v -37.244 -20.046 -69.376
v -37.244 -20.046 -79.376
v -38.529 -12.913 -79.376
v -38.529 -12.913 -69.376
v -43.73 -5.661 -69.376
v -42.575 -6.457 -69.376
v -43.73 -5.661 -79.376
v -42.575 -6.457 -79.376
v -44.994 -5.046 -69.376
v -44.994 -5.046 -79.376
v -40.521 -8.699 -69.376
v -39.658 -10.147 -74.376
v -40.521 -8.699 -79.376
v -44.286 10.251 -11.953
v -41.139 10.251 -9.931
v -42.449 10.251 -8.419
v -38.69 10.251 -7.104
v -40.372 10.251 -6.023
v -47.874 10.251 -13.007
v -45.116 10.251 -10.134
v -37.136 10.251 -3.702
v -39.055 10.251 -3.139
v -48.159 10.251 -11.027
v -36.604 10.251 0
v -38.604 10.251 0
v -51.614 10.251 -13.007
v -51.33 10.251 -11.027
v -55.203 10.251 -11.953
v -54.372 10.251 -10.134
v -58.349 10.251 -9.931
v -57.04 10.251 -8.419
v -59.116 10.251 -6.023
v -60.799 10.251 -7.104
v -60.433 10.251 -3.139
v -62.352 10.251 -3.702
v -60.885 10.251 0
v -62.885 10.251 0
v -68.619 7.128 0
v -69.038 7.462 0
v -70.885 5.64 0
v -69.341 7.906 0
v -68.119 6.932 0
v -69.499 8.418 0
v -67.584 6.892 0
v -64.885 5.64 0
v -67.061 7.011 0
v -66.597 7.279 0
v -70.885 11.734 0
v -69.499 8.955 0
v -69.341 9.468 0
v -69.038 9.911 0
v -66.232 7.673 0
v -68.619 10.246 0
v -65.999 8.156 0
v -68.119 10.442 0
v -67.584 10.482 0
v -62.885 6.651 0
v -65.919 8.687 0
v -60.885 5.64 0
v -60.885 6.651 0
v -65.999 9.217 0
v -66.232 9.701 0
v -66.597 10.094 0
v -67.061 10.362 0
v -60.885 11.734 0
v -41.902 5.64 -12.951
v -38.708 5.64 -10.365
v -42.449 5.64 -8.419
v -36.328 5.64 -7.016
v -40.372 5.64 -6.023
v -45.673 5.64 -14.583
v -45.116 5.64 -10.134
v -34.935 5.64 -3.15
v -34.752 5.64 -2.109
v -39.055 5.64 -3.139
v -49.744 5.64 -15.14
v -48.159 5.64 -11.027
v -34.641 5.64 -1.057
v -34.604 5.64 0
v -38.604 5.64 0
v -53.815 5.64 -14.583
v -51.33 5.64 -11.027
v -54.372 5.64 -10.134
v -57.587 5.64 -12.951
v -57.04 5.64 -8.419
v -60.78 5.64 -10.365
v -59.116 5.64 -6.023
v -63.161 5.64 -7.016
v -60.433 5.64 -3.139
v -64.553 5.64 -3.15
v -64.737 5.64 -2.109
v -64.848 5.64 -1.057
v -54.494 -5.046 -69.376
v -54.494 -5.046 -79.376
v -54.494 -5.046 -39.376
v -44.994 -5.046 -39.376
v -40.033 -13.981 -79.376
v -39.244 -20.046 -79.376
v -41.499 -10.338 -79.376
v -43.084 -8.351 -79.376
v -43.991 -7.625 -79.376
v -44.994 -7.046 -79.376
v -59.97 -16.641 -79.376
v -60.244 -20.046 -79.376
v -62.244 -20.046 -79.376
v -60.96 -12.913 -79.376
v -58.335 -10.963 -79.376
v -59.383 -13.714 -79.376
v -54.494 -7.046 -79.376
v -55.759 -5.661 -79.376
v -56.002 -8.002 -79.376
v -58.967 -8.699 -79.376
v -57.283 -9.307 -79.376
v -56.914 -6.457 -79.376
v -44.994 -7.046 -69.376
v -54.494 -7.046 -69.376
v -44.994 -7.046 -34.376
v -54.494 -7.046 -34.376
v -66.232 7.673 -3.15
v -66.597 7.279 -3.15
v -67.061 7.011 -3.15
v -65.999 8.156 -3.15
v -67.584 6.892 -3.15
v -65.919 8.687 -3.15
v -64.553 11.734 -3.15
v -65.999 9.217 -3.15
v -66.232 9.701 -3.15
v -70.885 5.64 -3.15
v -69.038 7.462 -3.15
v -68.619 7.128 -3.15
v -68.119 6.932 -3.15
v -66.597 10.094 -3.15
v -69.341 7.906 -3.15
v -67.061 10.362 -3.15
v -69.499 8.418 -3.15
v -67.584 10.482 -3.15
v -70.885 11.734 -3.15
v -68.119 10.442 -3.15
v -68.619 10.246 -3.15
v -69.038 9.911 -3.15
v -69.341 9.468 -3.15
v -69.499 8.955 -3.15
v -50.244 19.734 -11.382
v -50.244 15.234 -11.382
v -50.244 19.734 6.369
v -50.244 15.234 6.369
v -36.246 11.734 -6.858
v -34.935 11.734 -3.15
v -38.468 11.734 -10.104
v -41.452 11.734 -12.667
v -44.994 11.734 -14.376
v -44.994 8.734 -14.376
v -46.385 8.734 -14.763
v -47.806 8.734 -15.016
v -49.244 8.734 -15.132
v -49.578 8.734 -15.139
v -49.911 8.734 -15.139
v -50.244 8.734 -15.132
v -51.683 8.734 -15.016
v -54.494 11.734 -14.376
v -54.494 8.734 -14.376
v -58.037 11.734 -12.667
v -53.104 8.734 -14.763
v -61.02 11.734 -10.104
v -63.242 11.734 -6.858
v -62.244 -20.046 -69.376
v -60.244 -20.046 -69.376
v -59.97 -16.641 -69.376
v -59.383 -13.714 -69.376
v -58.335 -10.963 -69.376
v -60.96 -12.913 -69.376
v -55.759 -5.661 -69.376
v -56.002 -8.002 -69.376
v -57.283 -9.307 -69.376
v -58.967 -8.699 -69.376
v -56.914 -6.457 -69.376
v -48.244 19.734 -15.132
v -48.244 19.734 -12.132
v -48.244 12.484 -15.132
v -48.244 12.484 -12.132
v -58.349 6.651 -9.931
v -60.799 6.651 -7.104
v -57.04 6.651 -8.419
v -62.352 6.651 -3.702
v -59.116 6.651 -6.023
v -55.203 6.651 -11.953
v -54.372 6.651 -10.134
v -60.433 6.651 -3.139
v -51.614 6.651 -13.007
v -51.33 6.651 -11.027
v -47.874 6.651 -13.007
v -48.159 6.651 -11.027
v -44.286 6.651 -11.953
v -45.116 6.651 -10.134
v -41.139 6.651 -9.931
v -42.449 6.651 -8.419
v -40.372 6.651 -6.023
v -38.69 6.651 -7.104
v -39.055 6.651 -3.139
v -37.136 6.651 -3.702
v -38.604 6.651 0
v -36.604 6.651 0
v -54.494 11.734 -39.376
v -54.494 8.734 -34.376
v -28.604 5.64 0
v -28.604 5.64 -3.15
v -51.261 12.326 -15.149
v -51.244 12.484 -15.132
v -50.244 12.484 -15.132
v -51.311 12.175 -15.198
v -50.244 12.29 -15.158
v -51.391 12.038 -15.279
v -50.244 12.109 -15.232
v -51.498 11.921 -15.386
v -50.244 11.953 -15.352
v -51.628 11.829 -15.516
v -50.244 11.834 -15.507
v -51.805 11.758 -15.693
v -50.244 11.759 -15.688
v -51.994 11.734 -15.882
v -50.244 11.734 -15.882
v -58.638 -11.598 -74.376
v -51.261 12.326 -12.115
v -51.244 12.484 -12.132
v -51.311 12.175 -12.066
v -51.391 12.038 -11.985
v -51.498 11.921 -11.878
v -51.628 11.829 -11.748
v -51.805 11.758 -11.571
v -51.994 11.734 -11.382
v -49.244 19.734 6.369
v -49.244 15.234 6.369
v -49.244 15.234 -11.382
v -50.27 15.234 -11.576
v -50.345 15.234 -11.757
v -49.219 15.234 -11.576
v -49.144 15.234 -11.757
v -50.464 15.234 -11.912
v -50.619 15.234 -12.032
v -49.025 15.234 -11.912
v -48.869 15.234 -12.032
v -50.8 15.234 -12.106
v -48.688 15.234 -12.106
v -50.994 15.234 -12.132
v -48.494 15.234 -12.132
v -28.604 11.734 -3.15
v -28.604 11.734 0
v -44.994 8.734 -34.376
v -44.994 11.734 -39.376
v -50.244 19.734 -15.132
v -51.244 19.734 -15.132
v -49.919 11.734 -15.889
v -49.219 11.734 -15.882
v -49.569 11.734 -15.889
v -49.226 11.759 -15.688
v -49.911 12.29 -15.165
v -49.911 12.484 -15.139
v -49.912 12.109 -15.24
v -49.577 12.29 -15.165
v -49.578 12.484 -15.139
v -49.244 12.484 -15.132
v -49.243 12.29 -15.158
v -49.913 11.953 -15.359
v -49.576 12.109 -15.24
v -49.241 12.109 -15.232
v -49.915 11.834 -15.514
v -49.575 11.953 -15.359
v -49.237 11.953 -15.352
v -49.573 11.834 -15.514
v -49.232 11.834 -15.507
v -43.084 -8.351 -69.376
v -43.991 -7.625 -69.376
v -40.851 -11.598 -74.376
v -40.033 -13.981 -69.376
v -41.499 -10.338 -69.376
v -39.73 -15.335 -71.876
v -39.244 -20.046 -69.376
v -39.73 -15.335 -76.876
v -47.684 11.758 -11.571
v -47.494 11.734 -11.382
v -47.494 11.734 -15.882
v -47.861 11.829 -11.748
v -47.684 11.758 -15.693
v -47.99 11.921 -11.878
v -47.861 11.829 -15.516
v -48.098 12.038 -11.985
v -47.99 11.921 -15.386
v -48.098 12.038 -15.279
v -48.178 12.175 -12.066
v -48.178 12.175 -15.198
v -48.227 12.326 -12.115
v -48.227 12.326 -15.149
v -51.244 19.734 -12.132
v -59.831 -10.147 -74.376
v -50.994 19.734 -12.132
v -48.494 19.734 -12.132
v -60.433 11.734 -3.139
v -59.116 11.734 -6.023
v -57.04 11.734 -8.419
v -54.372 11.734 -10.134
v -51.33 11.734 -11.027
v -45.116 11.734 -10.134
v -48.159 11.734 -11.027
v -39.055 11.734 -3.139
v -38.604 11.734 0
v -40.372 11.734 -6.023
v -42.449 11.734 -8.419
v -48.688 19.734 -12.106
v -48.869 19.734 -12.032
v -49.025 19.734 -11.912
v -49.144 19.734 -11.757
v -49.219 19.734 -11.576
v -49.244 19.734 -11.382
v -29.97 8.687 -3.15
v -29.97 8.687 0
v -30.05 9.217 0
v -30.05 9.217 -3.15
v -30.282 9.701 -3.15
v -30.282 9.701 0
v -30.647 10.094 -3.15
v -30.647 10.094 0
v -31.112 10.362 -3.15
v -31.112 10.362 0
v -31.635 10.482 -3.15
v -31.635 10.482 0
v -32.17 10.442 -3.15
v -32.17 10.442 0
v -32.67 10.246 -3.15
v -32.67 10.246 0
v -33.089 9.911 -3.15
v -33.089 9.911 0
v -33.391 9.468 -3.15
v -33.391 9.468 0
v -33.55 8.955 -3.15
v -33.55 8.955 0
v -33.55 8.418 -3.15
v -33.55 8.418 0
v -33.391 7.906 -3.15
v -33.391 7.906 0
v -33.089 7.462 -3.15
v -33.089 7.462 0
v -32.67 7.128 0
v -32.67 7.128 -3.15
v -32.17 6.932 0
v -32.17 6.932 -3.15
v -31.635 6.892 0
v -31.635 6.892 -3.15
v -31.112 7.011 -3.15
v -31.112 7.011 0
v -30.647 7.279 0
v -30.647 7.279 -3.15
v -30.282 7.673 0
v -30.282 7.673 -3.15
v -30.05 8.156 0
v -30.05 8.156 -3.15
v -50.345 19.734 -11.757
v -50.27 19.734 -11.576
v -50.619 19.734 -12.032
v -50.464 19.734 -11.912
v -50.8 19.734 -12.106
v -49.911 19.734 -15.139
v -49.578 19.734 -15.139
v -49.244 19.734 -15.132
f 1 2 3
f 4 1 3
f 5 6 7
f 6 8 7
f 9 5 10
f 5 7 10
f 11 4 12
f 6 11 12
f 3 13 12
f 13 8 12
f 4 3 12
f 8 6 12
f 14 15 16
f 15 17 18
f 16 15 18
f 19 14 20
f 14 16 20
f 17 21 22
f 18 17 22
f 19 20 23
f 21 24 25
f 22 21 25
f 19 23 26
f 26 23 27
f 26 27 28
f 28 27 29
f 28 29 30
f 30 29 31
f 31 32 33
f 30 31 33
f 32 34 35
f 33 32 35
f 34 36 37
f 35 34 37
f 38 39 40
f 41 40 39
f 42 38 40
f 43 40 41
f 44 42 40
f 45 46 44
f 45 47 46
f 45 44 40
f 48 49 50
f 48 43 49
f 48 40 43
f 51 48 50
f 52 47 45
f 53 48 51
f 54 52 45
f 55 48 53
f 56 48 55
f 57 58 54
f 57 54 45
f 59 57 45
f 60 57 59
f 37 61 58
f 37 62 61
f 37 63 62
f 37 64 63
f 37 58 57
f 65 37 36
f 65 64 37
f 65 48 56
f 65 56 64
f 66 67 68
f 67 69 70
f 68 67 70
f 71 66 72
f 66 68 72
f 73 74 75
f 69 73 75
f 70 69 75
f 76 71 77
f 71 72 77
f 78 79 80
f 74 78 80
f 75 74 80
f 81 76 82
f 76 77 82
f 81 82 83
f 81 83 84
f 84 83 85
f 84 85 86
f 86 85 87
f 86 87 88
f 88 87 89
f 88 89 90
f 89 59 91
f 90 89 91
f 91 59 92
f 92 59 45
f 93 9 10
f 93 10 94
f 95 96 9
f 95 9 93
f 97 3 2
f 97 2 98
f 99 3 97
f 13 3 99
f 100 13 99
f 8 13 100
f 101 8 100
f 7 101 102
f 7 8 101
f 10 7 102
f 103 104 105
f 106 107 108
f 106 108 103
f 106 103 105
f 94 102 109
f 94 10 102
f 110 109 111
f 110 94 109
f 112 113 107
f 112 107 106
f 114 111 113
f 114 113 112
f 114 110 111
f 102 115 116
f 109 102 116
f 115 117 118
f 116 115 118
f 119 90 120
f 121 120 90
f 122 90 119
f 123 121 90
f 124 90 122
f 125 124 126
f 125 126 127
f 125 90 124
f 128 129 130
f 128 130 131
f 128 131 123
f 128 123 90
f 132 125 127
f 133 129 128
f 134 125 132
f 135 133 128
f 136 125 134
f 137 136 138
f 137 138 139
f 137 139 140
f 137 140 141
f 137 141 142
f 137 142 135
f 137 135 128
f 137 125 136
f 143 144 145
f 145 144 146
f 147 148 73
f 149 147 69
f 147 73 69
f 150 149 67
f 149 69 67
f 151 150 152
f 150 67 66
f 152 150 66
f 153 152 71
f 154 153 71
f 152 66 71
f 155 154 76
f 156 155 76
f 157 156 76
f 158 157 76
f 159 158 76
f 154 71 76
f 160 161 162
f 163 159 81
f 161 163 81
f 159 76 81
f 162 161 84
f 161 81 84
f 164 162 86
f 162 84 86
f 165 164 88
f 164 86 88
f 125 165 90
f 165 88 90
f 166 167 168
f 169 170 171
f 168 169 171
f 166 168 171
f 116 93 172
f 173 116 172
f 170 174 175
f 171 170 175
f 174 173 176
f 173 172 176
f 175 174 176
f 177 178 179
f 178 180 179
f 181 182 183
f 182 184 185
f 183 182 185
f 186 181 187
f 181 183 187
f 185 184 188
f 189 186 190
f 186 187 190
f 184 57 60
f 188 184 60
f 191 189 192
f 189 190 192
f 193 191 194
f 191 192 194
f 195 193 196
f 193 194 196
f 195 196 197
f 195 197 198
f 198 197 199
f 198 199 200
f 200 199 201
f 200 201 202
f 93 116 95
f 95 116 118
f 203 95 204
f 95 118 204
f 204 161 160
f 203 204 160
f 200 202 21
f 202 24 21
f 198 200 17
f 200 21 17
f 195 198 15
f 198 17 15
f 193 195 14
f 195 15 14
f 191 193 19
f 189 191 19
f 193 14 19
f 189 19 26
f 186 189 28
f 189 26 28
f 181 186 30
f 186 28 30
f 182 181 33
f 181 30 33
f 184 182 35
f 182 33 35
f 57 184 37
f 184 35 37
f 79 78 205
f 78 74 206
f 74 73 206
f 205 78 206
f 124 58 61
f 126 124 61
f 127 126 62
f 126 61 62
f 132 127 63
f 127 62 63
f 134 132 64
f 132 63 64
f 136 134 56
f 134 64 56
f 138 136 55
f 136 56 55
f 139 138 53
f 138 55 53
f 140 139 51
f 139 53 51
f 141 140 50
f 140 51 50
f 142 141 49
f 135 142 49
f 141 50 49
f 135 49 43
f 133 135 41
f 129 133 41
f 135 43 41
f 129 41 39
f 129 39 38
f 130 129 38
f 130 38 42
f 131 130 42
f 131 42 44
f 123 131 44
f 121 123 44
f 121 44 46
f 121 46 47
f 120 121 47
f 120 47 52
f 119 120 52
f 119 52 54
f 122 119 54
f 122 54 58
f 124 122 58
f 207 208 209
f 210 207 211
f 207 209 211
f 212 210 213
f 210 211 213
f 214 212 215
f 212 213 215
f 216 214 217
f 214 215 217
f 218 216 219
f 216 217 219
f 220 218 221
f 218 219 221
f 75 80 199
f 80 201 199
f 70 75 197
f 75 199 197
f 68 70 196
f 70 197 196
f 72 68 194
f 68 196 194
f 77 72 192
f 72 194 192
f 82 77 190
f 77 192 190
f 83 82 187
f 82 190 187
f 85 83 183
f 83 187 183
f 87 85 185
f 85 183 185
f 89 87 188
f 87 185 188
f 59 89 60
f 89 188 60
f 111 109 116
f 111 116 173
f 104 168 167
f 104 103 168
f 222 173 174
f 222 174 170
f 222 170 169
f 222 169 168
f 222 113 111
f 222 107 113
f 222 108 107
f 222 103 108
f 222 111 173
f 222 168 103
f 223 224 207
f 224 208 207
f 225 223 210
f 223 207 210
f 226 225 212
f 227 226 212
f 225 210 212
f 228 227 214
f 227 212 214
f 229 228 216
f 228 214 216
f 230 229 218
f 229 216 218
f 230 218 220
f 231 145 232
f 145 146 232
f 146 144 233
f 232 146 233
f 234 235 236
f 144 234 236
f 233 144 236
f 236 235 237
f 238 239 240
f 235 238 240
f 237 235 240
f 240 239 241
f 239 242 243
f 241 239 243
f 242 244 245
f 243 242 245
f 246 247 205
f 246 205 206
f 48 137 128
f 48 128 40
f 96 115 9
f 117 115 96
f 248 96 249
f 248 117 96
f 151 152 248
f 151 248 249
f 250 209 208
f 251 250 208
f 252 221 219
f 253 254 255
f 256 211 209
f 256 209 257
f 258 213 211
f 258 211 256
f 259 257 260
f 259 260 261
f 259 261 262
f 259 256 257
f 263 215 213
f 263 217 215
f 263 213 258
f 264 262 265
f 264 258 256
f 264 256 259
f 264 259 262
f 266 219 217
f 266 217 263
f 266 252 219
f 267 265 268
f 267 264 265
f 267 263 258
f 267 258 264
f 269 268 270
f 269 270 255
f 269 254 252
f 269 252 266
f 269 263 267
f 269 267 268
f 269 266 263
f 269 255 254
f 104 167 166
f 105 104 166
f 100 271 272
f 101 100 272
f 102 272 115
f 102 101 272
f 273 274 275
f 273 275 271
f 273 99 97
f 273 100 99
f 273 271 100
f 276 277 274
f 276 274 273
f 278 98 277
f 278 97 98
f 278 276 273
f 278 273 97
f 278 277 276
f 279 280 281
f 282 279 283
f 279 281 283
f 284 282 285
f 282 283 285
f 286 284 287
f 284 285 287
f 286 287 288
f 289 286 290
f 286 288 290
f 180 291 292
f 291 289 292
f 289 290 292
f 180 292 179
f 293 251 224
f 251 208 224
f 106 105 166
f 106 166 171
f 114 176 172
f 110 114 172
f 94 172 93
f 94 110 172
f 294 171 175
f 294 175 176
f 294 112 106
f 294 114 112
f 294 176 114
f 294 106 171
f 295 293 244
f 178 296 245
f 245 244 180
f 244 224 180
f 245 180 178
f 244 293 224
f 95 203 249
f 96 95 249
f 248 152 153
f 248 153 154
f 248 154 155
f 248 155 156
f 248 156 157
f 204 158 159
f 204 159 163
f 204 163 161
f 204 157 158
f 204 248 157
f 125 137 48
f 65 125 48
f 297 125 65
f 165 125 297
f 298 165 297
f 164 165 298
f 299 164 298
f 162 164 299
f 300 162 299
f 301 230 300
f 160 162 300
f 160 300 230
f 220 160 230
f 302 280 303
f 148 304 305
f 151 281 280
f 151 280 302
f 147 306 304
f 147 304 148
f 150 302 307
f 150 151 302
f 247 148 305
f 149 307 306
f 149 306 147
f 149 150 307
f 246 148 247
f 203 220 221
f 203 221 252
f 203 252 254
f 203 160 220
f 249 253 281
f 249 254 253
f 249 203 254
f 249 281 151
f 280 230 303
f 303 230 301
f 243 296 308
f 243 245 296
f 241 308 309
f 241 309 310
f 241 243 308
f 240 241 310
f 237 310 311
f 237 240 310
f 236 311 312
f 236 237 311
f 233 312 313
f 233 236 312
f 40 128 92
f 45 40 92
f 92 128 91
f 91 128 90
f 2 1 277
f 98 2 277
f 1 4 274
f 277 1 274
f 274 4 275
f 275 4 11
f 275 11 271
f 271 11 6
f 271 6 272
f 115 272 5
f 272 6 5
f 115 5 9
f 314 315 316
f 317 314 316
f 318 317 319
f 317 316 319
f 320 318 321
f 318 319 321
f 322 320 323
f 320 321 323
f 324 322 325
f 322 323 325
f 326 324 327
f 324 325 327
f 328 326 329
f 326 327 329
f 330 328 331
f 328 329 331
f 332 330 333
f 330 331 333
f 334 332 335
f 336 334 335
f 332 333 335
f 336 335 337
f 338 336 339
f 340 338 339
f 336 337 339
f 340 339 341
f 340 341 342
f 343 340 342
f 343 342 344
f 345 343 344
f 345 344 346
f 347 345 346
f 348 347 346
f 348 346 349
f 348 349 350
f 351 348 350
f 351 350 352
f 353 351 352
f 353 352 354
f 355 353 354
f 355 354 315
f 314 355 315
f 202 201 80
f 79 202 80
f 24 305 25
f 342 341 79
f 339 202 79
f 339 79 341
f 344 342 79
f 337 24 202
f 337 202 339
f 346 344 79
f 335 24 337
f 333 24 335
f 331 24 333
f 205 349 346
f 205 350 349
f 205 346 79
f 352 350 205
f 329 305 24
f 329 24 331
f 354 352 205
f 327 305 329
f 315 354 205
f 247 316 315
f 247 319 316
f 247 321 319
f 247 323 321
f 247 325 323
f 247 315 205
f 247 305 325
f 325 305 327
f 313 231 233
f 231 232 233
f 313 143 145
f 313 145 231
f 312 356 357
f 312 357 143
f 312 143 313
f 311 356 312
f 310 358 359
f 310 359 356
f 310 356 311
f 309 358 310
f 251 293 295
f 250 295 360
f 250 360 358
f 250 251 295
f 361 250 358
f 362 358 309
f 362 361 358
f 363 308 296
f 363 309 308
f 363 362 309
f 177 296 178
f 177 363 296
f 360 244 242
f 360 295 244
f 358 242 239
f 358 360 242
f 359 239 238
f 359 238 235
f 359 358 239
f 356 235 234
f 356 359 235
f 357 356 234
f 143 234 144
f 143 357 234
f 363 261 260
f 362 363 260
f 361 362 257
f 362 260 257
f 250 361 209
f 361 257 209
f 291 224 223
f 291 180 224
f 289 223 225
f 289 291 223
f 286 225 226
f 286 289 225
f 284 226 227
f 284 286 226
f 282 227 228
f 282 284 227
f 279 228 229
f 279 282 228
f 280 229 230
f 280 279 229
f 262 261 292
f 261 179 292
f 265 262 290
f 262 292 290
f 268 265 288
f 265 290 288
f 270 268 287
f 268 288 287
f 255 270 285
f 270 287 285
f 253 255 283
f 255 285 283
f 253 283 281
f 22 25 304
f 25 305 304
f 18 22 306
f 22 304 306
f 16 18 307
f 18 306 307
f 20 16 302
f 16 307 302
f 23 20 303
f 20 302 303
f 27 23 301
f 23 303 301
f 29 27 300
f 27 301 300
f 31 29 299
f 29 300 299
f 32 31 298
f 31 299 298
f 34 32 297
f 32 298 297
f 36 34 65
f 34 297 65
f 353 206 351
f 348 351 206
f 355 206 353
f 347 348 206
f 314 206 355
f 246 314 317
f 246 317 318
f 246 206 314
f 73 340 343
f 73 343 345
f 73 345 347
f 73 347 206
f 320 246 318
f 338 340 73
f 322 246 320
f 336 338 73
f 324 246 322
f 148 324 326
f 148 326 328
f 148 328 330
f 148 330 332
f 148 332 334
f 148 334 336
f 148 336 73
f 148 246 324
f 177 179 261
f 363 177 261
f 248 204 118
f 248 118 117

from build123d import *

# Parameters (mm, degrees)
BOSS_EXTRUDE1_DEPTH = 6.5
BOSS_EXTRUDE2_DEPTH = 3
BOSS_EXTRUDE3_DEPTH = 3
SKETCH10_W          = 9.5
SKETCH10_H          = 5
BOSS_EXTRUDE4_DEPTH = 15.78
SKETCH11_W          = 9.5
SKETCH11_H          = 2
BOSS_EXTRUDE5_DEPTH = 40
BOSS_EXTRUDE6_DEPTH = 6.09393
SKETCH14_R          = 1.8
CUT_EXTRUDE1_DEPTH  = 6.3
SKETCH15_W          = 51.153217575
SKETCH15_H          = 21.210560201
CUT_EXTRUDE3_DEPTH  = 19.78
SKETCH18_W          = 3
SKETCH18_H          = 3
BOSS_EXTRUDE7_DEPTH = 6.5
FILLET1_R           = 0.75
BOSS_EXTRUDE8_DEPTH = 1.5
FILLET2_R           = 0.75
BOSS_EXTRUDE9_DEPTH = 10


with BuildPart() as part:
    # Sketch3 → Revolve1 (revolve)
    with BuildSketch(Plane.XY):
        Polygon((-62.694264441, 11.733728816), (-64.884531744, 11.733728816), (-64.884531744, 5.639799249), (-60.884531744, 5.639799249), (-60.884531744, 6.650679103), (-62.884531744, 6.650679103), (-62.884531744, 10.250679103), (-60.884531744, 10.250679103), (-60.884531744, 11.733728816), align=None)
    revolve(axis=Axis((-49.744264441, 0, 0), (0, 1, 0)))

    # Sketch7 → Boss-Extrude1 (add)
    with BuildSketch(Plane(origin=(0, 11.733728816, 0), x_dir=(1, 0, 0), z_dir=(0, 1, 0))):
        with BuildLine():
            Line((-50.244264441, 15.132008921), (-50.244264441, 13.130751112))
            ThreePointArc((-50.244264441, 13.130751112), (-49.744264441, 13.140267302), (-49.244264441, 13.130751112))
            Line((-49.244264441, 13.130751112), (-49.244264441, 15.132008921))
            ThreePointArc((-49.244264441, 15.132008921), (-49.744264441, 15.140267302), (-50.244264441, 15.132008921))
        make_face()
    extrude(amount=BOSS_EXTRUDE1_DEPTH)

    # Sketch8 → Boss-Extrude2 (add)
    with BuildSketch(Plane(origin=(0, 18.233728816, 0), x_dir=(1, 0, 0), z_dir=(0, 1, 0))):
        with BuildLine():
            Line((-50.244264441, 15.132008921), (-50.244264441, 13.130751112))
            Line((-50.244264441, 13.130751112), (-50.244264441, -6.369248888))
            Line((-50.244264441, -6.369248888), (-49.244264441, -6.369248888))
            Line((-49.244264441, -6.369248888), (-49.244264441, 13.130751112))
            Line((-49.244264441, 13.130751112), (-49.244264441, 15.132008921))
            ThreePointArc((-49.244264441, 15.132008921), (-49.744264441, 15.140267302), (-50.244264441, 15.132008921))
        make_face()
    extrude(amount=-BOSS_EXTRUDE2_DEPTH)

    # Sketch9 → Boss-Extrude3 (add)
    with BuildSketch(Plane(origin=(0, 11.733728816, 0), x_dir=(1, 0, 0), z_dir=(0, 1, 0))):
        with BuildLine():
            Line((-54.494264441, 14.375854548), (-54.494264441, 39.375854548))
            Line((-54.494264441, 39.375854548), (-44.994264441, 39.375854548))
            Line((-44.994264441, 39.375854548), (-44.994264441, 14.375854548))
            ThreePointArc((-44.994264441, 14.375854548), (-47.092177082, 14.906177465), (-49.244264441, 15.132008921))
            ThreePointArc((-49.244264441, 15.132008921), (-49.744264441, 15.140267302), (-50.244264441, 15.132008921))
            ThreePointArc((-50.244264441, 15.132008921), (-52.3963518, 14.906177465), (-54.494264441, 14.375854548))
        make_face()
    extrude(amount=-BOSS_EXTRUDE3_DEPTH)

    # Sketch10 → Boss-Extrude4 (add)
    with BuildSketch(Plane.XZ.offset(-8.733728816)):
        with Locations((-49.744264441, -36.875854548)):
            Rectangle(SKETCH10_W, SKETCH10_H)
    extrude(amount=BOSS_EXTRUDE4_DEPTH)

    # Sketch11 → Boss-Extrude5 (add)
    with BuildSketch(Plane(origin=(0, 0, -39.375854548), x_dir=(-1, 0, 0), z_dir=(0, 0, -1))):
        with Locations((49.744264441, -6.046271184)):
            Rectangle(SKETCH11_W, SKETCH11_H)
    extrude(amount=BOSS_EXTRUDE5_DEPTH)

    # Sketch13 → Boss-Extrude6 (add)
    with BuildSketch(Plane(origin=(0, 11.733728816, 0), x_dir=(1, 0, 0), z_dir=(0, 1, 0))):
        with BuildLine():
            Line((-28.603997139, 3.15), (-34.935307895, 3.15))
            ThreePointArc((-34.935307895, 3.15), (-34.603997139, 0), (-34.935307895, -3.15))
            Line((-34.935307895, -3.15), (-28.603997139, -3.15))
            Line((-28.603997139, -3.15), (-28.603997139, 3.15))
        make_face()
        with BuildLine():
            Line((-70.884531744, 3.15), (-70.884531744, -3.15))
            Line((-70.884531744, -3.15), (-64.553220987, -3.15))
            ThreePointArc((-64.553220987, -3.15), (-64.884531744, 0), (-64.553220987, 3.15))
            Line((-64.553220987, 3.15), (-70.884531744, 3.15))
        make_face()
    extrude(amount=-BOSS_EXTRUDE6_DEPTH)

    # Sketch14 → Cut-Extrude1 (cut)
    with BuildSketch(Plane.XY.offset(3.15)):
        with Locations((-31.769652517, 8.686764033)):
            Circle(SKETCH14_R)
        with Locations((-67.718876365, 8.686764033)):
            Circle(SKETCH14_R)
    extrude(amount=-CUT_EXTRUDE1_DEPTH, mode=Mode.SUBTRACT)

    # Sketch15 → Cut-Extrude3 (cut, through all)
    with BuildSketch(Plane(origin=(0, 11.733728816, 0), x_dir=(1, 0, 0), z_dir=(0, 1, 0))):
        with Locations((-49.018725857, -10.6052801)):
            Rectangle(SKETCH15_W, SKETCH15_H)
    extrude(amount=-CUT_EXTRUDE3_DEPTH, mode=Mode.SUBTRACT)

    # Sketch18 → Boss-Extrude7 (add)
    with BuildSketch(Plane(origin=(0, 11.733728816, 0), x_dir=(1, 0, 0), z_dir=(0, 1, 0))):
        with Locations((-49.744264441, 13.632008921)):
            Rectangle(SKETCH18_W, SKETCH18_H)
    extrude(amount=BOSS_EXTRUDE7_DEPTH)

    # Fillet1
    fillet1_edges = [part.edges().sort_by_distance(p)[0] for p in [
        (-50.744264441, 11.733728816, -15.132008921),
        (-48.744264441, 11.733728816, -15.132008921),
        (-49.744264441, 11.733728816, -12.132008921),
        (-48.244264441, 11.733728816, -13.632008921),
        (-51.244264441, 11.733728816, -13.632008921),
        (-49.744264441, 11.733728816, -15.140267302),
    ]]
    fillet(fillet1_edges, radius=FILLET1_R)

    # Sketch19 → Boss-Extrude8 (add)
    with BuildSketch(Plane(origin=(0, 18.233728816, 0), x_dir=(1, 0, 0), z_dir=(0, 1, 0))):
        with BuildLine():
            Line((-50.244264441, 15.132008921), (-51.244264441, 15.132008921))
            Line((-51.244264441, 15.132008921), (-51.244264441, 12.132008921))
            Line((-51.244264441, 12.132008921), (-50.244264441, 12.132008921))
            Line((-50.244264441, 12.132008921), (-50.244264441, -6.369248888))
            Line((-50.244264441, -6.369248888), (-49.244264441, -6.369248888))
            Line((-49.244264441, -6.369248888), (-49.244264441, 12.132008921))
            Line((-49.244264441, 12.132008921), (-48.244264441, 12.132008921))
            Line((-48.244264441, 12.132008921), (-48.244264441, 15.132008921))
            Line((-48.244264441, 15.132008921), (-49.244264441, 15.132008921))
            ThreePointArc((-49.244264441, 15.132008921), (-49.744264441, 15.140267302), (-50.244264441, 15.132008921))
        make_face()
    extrude(amount=BOSS_EXTRUDE8_DEPTH)

    # Fillet2
    fillet2_edges = [part.edges().sort_by_distance(p)[0] for p in [
        (-50.244264441, 17.483728816, -12.132008921),
        (-49.244264441, 17.483728816, -12.132008921),
    ]]
    fillet(fillet2_edges, radius=FILLET2_R)

    # Sketch20 → Boss-Extrude9 (add)
    with BuildSketch(Plane(origin=(0, 0, -79.375854548), x_dir=(-1, 0, 0), z_dir=(0, 0, -1))):
        with BuildLine():
            Line((37.244264441, -20.046271184), (39.244264441, -20.046271184))
            add(Edge.make_bspline(
                [(39.244264441, -20.046271184), (39.582311707, -9.650122804), (44.994264441, -7.046271184)],
                knots=[0, 0, 0, 0.599407443, 0.599407443, 0.599407443], degree=2))
            Line((44.994264441, -7.046271184), (54.494264441, -7.046271184))
            add(Edge.make_bspline(
                [(54.494264441, -7.046271184), (59.906217176, -9.650122804), (60.244264441, -20.046271184)],
                knots=[0.400592557, 0.400592557, 0.400592557, 1, 1, 1], degree=2))
            Line((60.244264441, -20.046271184), (62.244264441, -20.046271184))
            add(Edge.make_bspline(
                [(62.244264441, -20.046271184), (61.29176104, -7.746792571), (54.494264441, -5.046271184)],
                knots=[0, 0, 0, 0.639930482, 0.639930482, 0.639930482], degree=2))
            Line((54.494264441, -5.046271184), (44.994264441, -5.046271184))
            add(Edge.make_bspline(
                [(37.244264441, -20.046271184), (38.196767843, -7.746792571), (44.994264441, -5.046271184)],
                knots=[0, 0, 0, 0.639930482, 0.639930482, 0.639930482], degree=2))
        make_face()
    extrude(amount=-BOSS_EXTRUDE9_DEPTH)


solid = part.part
